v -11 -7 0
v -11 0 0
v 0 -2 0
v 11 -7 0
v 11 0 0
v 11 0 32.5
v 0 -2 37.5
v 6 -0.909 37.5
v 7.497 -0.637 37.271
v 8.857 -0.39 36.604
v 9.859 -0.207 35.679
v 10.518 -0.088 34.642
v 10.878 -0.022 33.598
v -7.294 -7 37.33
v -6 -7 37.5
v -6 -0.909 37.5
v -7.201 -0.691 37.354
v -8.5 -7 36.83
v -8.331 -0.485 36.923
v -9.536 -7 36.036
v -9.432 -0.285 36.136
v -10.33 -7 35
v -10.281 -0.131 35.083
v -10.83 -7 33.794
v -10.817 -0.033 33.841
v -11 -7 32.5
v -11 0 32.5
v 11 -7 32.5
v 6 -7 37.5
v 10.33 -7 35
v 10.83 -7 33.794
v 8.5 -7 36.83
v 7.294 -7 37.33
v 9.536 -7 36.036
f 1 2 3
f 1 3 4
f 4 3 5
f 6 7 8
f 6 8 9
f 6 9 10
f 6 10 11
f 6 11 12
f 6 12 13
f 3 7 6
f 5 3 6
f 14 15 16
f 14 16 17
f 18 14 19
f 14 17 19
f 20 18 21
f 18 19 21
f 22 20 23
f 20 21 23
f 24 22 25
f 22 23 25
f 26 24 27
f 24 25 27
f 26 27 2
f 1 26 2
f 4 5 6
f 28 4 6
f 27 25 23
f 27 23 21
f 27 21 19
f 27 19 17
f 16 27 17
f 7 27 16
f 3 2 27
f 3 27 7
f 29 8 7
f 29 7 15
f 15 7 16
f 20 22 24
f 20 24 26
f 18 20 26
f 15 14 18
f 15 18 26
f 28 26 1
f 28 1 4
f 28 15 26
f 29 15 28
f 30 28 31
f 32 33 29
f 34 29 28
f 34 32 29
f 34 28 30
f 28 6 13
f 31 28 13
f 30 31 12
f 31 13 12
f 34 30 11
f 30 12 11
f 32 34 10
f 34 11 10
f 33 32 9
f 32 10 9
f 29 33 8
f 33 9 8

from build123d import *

# Parameters (mm, degrees)
EXTRUDE_2_DEPTH     = 7
CUT_EXTRUDE_1_DEPTH = 40.702015062


with BuildPart() as part:
    # 草图1 → 凸台-拉伸2 (new body)
    with BuildSketch(Plane.XZ):
        with BuildLine():
            Line((6, 37.5), (-6, 37.5))
            ThreePointArc((-6, 37.5), (-9.535533906, 36.035533906), (-11, 32.5))
            Line((-11, 32.5), (-11, 0))
            Line((-11, 0), (11, 0))
            Line((11, 0), (11, 32.5))
            ThreePointArc((11, 32.5), (9.535533906, 36.035533906), (6, 37.5))
        make_face()
    extrude(amount=EXTRUDE_2_DEPTH)

    # 草图2 → 切除-拉伸1 (cut, through all)
    with BuildSketch(Plane(origin=(0, 0, 0), x_dir=(-1, 0, 0), z_dir=(0, 0, -1))):
        Polygon((-11, 0), (11, 0), (0, -2), align=None)
    extrude(amount=-CUT_EXTRUDE_1_DEPTH, mode=Mode.SUBTRACT)


solid = part.part
